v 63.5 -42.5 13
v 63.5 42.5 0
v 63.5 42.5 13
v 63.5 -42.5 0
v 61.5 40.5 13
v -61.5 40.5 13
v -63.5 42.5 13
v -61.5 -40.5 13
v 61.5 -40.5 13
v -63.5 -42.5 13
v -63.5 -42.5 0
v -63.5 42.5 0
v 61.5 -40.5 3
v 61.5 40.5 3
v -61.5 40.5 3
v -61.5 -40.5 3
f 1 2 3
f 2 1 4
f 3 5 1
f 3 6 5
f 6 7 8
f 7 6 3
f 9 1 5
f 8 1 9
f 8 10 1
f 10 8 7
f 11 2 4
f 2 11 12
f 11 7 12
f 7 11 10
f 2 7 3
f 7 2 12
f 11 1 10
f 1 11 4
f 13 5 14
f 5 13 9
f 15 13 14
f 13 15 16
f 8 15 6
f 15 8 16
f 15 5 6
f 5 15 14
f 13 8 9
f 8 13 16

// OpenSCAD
// Pipette rack tray. Assumption: wall's 10 mm stands on top of the 3 mm base (13 mm total).
base_t = 3;
wall_t = 2;
wall_h = 10;
in_x = 123;  // 122 + 0.5 clearance each side
in_y = 81;   // 80 + 0.5 clearance each side
out_x = in_x + 2*wall_t; // 127
out_y = in_y + 2*wall_t; // 85

difference() {
    translate([-out_x/2, -out_y/2, 0]) cube([out_x, out_y, base_t + wall_h]);
    translate([-in_x/2, -in_y/2, base_t]) cube([in_x, in_y, wall_h + 1]);
}
